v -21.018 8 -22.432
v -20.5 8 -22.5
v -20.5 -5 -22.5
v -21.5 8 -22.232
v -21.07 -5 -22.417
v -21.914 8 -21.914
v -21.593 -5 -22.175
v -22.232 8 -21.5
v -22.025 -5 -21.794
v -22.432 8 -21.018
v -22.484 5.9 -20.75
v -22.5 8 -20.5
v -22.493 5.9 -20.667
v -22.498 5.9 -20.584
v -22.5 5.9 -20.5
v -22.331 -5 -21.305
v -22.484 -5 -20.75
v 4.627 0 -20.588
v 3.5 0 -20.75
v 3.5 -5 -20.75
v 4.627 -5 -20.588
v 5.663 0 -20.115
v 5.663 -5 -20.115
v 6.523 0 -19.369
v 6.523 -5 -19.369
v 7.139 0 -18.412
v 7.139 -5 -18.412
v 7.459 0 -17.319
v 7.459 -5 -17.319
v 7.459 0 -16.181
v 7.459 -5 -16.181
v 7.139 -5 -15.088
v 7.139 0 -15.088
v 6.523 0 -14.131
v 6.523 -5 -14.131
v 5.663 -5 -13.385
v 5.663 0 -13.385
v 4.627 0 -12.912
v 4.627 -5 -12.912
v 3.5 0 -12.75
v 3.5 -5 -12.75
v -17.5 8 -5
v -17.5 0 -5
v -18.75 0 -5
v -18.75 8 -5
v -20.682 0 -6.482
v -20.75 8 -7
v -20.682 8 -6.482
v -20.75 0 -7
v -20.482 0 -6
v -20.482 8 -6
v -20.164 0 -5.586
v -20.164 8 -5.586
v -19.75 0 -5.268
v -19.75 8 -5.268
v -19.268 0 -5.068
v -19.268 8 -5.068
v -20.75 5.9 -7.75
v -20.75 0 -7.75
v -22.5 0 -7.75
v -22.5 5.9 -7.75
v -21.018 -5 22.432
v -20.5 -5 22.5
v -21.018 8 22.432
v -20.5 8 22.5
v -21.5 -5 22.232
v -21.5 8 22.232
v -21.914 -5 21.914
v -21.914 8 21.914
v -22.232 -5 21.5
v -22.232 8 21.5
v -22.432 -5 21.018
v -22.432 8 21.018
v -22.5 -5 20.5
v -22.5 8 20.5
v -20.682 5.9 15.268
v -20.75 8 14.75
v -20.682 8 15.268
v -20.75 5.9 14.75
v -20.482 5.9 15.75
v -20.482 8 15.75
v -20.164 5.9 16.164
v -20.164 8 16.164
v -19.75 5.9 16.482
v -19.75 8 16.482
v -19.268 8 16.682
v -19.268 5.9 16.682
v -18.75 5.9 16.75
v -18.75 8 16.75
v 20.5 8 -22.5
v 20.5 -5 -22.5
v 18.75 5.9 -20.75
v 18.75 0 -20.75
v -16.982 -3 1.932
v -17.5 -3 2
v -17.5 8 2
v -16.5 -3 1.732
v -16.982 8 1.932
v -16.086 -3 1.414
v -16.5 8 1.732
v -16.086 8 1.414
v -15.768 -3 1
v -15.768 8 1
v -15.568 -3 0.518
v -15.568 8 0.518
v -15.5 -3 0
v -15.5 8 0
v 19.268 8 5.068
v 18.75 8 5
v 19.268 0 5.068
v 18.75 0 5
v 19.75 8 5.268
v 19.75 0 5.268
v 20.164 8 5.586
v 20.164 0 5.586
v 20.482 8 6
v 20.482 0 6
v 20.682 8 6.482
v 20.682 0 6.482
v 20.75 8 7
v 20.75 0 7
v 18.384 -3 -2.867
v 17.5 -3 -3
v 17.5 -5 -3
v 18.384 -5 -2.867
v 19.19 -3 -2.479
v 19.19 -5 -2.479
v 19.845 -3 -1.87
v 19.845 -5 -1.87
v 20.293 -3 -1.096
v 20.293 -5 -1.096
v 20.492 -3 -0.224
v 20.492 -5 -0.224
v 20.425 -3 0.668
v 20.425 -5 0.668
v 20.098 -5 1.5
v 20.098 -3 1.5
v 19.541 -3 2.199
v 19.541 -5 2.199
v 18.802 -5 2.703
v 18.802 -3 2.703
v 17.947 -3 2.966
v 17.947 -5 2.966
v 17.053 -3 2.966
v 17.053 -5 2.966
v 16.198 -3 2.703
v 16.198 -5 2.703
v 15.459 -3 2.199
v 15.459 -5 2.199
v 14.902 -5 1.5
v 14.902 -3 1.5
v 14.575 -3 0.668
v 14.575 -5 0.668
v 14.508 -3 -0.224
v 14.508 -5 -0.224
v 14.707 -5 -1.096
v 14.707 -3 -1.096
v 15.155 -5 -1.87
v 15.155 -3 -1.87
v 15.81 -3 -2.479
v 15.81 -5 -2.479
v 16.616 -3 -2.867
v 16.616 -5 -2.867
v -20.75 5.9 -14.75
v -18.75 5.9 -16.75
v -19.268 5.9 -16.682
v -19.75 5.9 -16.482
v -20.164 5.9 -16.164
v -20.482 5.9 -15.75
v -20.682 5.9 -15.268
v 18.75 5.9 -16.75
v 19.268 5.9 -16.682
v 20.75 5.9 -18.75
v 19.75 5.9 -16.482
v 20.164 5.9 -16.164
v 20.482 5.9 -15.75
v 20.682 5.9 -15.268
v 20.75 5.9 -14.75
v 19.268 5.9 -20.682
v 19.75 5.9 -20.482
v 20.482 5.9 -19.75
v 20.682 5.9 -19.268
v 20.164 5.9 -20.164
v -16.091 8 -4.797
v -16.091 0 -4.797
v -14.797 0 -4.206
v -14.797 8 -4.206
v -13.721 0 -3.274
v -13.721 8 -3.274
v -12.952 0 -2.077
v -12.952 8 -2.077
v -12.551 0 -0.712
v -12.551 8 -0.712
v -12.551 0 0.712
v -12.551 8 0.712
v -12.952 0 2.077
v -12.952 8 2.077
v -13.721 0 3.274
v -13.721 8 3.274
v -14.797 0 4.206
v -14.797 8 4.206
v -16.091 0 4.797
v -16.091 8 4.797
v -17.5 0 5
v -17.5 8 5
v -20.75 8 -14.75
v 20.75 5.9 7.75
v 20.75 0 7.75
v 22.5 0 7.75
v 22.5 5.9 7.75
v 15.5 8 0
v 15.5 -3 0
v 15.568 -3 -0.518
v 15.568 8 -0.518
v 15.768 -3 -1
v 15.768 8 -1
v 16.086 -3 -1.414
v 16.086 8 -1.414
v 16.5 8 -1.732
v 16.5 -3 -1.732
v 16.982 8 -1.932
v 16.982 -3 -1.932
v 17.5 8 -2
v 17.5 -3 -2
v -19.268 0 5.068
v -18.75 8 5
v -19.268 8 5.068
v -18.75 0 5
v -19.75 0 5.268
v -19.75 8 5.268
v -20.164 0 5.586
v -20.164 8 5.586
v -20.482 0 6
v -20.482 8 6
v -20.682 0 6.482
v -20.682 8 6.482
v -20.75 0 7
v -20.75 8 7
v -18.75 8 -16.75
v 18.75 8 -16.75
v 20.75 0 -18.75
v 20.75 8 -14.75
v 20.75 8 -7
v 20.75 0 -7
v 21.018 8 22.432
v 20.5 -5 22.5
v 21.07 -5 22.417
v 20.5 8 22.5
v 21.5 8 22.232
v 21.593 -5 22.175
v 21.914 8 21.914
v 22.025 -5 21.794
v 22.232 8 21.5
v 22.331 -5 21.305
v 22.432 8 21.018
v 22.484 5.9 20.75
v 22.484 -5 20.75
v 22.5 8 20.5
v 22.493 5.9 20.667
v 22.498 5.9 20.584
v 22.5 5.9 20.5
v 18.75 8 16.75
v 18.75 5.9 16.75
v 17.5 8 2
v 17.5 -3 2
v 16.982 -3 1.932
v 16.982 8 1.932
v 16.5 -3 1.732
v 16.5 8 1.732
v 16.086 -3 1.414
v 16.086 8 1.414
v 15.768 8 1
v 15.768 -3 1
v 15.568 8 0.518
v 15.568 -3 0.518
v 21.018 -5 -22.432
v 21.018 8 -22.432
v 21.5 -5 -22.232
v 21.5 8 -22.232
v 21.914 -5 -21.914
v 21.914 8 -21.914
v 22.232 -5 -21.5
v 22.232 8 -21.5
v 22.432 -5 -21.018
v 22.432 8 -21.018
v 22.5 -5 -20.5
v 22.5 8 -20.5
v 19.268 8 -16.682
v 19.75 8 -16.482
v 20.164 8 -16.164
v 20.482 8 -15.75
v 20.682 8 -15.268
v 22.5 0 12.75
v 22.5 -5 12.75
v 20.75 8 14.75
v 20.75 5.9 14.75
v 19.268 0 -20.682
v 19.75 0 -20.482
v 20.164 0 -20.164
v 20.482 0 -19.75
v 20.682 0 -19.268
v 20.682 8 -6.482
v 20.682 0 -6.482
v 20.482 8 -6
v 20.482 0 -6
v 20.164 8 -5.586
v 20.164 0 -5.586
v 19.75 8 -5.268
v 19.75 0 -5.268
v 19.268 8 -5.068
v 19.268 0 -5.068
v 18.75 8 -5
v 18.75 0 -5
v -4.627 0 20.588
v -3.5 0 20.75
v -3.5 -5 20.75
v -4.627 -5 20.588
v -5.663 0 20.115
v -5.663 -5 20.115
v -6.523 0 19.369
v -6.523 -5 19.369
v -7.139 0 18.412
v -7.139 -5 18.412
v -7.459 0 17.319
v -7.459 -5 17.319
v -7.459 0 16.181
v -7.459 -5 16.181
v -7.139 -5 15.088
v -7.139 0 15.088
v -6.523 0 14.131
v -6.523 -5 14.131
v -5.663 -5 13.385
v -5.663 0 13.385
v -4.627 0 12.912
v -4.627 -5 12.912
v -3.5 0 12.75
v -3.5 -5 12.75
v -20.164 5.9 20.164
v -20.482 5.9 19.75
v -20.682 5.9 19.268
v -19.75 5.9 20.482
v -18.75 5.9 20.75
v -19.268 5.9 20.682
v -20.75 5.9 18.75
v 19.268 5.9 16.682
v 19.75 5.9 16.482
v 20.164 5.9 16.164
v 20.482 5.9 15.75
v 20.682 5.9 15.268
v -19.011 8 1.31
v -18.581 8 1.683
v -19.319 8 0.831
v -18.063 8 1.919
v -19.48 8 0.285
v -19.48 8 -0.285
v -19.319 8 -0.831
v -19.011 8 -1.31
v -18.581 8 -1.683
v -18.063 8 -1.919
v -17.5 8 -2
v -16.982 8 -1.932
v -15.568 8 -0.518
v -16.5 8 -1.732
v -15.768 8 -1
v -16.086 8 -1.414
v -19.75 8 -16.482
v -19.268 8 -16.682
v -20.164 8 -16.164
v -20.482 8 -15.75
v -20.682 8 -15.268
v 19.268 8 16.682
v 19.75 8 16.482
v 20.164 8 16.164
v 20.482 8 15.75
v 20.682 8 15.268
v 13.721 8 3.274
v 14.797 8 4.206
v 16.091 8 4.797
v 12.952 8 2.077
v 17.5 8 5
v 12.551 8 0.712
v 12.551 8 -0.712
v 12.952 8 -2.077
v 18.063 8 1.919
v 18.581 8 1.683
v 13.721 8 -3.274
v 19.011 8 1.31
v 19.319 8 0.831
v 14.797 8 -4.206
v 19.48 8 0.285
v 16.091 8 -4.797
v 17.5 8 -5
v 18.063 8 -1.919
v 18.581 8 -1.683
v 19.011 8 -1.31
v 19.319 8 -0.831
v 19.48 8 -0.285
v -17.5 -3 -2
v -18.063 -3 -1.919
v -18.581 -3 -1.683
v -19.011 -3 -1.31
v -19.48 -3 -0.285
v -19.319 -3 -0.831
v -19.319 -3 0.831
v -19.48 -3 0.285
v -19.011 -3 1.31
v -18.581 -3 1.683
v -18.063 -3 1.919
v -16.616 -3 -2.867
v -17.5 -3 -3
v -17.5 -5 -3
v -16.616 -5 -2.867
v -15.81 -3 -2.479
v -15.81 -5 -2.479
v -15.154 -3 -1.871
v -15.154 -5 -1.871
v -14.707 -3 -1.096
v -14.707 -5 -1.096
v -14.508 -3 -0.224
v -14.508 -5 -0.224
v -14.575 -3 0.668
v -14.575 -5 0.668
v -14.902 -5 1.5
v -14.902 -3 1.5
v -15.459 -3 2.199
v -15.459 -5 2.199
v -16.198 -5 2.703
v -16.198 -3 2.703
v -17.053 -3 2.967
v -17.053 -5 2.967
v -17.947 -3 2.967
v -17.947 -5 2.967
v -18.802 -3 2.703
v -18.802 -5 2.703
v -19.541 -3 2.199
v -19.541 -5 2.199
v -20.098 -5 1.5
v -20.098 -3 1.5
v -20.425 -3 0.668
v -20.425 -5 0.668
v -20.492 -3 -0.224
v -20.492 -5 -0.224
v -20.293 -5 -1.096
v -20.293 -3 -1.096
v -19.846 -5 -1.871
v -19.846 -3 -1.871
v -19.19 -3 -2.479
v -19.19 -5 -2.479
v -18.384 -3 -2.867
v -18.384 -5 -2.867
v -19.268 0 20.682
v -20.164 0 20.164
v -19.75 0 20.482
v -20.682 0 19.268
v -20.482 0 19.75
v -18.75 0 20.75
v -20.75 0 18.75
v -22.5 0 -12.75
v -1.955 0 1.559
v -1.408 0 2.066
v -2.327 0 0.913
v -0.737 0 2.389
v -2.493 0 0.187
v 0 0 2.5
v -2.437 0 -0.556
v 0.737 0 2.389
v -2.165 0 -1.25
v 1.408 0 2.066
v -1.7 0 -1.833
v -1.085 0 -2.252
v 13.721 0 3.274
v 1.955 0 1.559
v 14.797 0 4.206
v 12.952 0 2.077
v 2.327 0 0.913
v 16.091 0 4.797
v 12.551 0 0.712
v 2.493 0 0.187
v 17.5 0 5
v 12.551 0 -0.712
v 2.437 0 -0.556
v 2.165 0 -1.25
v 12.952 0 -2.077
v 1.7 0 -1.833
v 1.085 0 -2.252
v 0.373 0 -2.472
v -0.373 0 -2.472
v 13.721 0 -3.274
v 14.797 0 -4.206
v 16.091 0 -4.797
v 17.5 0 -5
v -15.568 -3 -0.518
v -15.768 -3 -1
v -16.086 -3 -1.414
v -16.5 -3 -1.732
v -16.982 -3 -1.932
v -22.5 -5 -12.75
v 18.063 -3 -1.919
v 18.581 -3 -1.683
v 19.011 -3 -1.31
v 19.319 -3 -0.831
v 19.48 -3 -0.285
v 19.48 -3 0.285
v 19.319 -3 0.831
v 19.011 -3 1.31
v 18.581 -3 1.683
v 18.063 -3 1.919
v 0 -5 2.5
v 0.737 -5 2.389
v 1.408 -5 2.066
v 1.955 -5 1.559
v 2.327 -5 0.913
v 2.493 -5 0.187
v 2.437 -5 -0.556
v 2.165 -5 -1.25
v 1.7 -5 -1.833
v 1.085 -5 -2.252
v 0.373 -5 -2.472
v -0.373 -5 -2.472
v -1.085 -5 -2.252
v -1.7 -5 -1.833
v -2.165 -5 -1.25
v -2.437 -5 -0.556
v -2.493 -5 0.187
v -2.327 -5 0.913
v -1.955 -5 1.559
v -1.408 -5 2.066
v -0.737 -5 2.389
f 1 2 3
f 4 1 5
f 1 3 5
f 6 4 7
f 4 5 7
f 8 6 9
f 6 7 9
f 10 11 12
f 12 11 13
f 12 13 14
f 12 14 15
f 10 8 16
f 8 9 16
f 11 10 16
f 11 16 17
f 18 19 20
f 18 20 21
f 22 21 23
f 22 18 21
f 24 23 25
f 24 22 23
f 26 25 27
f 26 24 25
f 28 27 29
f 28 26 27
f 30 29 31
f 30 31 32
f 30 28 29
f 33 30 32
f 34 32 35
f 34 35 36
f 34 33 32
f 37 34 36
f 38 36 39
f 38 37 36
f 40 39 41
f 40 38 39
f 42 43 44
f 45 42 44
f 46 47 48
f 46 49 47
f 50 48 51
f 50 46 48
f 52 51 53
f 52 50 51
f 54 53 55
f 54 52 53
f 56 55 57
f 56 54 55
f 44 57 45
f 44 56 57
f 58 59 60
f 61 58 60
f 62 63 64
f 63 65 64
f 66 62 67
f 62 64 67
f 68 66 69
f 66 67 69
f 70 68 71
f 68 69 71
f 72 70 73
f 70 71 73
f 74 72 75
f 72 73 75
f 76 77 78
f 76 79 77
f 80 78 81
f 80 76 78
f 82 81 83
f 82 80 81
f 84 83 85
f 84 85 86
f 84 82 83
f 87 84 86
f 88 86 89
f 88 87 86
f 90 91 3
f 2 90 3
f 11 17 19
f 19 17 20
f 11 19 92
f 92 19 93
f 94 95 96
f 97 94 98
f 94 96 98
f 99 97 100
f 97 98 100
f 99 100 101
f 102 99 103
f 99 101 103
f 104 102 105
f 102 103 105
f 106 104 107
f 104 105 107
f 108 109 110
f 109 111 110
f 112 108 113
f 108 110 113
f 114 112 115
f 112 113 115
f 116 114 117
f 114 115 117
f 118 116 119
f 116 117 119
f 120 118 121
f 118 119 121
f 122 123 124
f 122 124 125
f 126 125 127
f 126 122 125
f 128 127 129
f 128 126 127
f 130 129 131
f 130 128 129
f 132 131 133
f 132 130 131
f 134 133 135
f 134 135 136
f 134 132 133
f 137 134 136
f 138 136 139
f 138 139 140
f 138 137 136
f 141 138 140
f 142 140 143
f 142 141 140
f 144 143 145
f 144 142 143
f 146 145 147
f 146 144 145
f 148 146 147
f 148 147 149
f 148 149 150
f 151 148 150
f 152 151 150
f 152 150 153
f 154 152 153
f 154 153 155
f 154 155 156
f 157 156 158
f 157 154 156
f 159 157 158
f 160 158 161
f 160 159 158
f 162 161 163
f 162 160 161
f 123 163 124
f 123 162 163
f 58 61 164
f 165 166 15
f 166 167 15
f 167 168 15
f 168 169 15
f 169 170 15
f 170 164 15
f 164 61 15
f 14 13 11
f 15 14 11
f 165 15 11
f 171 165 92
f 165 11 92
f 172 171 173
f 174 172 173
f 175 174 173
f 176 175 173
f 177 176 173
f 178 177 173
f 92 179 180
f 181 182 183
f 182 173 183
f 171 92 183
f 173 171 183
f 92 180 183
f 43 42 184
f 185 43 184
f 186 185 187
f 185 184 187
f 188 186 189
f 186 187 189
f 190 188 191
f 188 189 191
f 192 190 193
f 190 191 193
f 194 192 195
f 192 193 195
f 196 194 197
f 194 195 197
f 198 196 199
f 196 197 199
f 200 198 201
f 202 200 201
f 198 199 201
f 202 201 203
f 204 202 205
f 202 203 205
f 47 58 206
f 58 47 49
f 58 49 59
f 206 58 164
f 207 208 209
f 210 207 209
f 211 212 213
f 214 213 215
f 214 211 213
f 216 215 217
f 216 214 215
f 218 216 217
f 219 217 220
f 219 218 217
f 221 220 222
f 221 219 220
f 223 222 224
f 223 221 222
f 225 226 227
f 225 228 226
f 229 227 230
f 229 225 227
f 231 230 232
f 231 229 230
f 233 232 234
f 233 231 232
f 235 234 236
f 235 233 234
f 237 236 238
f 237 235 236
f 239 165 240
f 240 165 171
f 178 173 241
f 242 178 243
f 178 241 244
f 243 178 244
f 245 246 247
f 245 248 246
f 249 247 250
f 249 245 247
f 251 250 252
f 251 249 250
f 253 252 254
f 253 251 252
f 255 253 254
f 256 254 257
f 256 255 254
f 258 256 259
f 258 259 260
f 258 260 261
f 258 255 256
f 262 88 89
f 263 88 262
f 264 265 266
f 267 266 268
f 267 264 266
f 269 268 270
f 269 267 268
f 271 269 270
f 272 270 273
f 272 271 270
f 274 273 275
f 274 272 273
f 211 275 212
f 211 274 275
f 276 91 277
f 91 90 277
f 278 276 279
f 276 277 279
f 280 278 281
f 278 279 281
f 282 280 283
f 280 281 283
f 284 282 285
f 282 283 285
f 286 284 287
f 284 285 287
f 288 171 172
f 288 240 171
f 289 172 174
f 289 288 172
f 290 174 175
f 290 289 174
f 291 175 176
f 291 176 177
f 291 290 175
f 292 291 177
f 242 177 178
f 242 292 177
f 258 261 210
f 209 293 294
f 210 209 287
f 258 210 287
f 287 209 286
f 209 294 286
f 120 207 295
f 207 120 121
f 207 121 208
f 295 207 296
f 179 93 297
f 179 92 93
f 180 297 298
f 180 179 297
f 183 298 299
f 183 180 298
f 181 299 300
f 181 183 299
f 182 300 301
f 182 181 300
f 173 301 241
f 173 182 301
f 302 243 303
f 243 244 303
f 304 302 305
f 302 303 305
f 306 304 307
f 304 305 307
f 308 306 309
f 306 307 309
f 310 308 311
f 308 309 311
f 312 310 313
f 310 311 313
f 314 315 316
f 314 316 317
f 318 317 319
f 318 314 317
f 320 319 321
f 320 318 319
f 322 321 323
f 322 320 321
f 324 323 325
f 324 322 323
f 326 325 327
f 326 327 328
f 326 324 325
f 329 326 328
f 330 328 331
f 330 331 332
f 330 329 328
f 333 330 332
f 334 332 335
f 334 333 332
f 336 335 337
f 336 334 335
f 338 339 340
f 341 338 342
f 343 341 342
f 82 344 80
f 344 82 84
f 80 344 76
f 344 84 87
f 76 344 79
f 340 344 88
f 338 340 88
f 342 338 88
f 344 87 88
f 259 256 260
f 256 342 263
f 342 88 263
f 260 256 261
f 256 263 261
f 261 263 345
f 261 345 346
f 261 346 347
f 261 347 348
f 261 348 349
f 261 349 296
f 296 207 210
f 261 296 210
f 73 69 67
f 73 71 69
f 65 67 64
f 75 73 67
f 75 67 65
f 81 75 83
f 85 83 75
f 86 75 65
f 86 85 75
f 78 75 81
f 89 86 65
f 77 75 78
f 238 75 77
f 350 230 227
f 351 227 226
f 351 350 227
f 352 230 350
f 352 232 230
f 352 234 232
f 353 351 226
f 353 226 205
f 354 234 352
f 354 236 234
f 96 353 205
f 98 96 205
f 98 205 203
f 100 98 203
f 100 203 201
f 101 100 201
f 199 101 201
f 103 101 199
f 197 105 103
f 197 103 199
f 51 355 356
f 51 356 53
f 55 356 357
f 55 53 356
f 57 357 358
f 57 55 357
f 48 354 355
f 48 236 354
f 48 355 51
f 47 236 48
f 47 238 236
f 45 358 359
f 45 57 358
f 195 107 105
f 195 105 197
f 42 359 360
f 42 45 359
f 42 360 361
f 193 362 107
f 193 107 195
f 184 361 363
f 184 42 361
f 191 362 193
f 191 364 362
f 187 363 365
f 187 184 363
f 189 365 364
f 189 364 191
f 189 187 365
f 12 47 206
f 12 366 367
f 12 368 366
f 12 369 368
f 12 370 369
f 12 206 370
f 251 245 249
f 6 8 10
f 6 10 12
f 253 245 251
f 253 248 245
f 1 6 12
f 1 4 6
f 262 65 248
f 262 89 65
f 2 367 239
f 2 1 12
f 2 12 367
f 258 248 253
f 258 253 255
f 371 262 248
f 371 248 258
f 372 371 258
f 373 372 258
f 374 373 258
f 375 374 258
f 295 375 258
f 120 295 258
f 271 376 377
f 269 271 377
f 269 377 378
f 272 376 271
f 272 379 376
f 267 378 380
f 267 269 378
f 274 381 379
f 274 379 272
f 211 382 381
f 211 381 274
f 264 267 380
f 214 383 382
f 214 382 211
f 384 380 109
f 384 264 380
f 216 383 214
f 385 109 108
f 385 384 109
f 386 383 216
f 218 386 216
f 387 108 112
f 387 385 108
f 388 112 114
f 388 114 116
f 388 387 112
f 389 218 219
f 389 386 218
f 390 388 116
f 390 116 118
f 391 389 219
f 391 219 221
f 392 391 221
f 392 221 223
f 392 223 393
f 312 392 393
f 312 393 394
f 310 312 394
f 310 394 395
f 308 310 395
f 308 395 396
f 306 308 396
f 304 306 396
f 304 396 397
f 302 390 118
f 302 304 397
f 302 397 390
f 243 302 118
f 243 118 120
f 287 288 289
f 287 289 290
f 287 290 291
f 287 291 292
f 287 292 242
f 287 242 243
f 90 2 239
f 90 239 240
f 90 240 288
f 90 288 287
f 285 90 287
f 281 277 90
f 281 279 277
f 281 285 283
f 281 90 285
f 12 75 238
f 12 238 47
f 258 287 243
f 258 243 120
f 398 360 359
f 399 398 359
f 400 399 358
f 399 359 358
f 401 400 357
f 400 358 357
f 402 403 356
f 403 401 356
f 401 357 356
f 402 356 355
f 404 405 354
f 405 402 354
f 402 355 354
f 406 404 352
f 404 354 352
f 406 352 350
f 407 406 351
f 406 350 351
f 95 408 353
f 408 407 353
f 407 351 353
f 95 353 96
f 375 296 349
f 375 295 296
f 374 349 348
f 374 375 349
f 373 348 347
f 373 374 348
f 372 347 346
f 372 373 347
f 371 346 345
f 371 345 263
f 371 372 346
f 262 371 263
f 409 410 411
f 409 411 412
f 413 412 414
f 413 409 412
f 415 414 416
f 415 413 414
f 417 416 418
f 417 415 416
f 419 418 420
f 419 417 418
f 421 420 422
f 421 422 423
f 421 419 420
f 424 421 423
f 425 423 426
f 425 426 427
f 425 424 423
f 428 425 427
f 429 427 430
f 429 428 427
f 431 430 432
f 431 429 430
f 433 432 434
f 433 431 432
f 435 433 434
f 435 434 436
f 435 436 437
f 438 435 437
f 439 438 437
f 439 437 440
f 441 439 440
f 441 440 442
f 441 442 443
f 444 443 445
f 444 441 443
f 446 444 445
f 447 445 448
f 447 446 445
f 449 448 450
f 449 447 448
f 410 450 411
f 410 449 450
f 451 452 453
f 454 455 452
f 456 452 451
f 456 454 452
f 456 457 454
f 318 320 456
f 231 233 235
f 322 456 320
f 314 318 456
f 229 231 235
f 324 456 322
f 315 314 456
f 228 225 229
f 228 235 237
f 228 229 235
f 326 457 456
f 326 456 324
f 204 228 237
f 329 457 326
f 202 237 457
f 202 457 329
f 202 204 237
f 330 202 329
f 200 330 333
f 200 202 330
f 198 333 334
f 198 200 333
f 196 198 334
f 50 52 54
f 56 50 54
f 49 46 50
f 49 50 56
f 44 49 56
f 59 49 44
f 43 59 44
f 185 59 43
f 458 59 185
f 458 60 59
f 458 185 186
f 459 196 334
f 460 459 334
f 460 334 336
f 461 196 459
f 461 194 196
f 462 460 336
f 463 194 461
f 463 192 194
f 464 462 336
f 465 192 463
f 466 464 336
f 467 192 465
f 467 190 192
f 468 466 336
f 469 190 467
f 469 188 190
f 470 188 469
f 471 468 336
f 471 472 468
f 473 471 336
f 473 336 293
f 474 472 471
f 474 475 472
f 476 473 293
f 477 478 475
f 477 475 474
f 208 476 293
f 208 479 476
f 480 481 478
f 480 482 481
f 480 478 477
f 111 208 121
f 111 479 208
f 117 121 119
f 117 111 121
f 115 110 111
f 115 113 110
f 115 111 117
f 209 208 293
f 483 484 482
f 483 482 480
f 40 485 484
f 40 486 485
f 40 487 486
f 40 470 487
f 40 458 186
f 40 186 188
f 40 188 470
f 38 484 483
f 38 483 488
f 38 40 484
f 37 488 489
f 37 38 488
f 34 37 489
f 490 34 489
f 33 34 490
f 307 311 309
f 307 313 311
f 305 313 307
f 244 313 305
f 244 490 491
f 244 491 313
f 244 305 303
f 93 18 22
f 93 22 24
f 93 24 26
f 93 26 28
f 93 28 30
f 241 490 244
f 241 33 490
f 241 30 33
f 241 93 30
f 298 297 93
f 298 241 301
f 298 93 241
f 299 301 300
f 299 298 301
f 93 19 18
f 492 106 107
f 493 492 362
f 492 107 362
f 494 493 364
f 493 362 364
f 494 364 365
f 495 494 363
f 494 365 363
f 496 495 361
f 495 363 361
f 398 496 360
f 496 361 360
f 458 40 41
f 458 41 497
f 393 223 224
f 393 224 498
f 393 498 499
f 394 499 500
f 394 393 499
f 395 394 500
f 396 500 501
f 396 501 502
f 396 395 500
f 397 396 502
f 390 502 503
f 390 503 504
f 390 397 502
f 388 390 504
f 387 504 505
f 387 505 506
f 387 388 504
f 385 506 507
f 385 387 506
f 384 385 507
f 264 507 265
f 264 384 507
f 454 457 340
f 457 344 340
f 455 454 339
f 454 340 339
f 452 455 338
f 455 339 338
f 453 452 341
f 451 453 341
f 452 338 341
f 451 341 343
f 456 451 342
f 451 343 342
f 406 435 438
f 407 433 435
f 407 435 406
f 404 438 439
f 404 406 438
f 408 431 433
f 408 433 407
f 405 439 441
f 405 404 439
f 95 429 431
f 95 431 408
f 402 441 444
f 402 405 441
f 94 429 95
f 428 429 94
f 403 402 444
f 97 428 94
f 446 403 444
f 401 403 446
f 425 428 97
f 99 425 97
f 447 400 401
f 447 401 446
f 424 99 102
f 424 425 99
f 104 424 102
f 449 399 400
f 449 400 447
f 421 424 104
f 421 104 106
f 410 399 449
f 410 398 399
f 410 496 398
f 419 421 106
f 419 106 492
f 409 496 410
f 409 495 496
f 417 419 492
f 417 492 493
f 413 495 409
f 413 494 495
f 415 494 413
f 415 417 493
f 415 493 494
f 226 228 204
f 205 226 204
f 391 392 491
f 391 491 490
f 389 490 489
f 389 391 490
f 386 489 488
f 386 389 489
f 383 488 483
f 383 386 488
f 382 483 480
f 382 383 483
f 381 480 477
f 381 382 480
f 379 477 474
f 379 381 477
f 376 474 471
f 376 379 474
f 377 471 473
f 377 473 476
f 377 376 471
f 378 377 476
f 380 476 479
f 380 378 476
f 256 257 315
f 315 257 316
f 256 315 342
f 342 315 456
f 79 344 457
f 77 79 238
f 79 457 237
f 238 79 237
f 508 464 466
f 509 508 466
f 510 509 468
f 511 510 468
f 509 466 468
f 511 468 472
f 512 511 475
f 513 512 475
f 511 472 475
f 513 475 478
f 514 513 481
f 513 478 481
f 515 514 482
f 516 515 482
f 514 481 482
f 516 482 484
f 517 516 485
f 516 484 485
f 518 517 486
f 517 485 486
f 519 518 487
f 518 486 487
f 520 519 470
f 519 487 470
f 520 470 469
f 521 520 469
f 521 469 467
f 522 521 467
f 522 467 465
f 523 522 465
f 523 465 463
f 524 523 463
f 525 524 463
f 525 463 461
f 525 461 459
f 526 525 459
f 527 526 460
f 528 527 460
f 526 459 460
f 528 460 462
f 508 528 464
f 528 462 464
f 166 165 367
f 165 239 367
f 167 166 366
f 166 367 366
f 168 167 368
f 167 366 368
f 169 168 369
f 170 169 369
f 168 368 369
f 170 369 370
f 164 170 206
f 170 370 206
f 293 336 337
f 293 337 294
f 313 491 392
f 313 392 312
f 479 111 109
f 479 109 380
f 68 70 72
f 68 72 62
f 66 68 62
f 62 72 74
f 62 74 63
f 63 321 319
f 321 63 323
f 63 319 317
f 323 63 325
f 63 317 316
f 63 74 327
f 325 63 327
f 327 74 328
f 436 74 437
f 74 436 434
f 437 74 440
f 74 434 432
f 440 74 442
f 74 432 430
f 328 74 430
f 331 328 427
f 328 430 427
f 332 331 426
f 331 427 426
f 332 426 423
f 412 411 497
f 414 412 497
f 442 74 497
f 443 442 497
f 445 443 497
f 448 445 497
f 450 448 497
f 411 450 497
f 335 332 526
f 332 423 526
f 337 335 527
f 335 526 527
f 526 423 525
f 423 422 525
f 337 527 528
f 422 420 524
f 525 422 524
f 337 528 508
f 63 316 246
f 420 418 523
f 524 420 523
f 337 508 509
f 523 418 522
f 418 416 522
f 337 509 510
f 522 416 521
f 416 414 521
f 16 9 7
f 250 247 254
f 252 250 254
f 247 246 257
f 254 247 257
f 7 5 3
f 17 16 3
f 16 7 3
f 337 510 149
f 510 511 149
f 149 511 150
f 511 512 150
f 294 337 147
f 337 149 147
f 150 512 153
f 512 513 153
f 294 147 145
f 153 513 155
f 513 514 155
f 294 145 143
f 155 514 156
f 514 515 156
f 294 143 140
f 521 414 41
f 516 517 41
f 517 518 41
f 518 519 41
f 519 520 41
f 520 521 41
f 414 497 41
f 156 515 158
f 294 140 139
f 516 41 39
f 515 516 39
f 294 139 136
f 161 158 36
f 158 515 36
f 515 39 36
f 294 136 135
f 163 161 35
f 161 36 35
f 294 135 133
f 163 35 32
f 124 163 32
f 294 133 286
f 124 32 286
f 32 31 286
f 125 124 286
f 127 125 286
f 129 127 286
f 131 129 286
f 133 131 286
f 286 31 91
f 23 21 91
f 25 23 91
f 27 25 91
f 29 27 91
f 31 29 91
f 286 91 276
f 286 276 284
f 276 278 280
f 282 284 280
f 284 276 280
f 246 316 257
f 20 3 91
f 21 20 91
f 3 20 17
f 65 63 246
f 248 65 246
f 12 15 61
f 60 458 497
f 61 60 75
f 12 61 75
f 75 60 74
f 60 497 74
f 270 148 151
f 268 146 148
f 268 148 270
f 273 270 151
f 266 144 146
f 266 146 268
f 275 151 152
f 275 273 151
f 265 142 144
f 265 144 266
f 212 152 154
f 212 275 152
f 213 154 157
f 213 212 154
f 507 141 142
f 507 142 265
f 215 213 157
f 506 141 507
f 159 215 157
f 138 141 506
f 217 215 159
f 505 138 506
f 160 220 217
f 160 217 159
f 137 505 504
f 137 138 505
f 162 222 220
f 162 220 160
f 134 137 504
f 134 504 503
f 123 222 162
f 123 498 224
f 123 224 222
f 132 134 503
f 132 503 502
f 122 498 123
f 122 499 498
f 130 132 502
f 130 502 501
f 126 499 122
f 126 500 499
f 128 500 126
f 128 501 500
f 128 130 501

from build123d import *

# Parameters (mm, degrees)
CROQUIS1_R                   = 2.5
SALIENTE_EXTRUIR1_DEPTH      = 5
SALIENTE_EXTRUIR2_DEPTH      = 6
SALIENTE_EXTRUIR5_DEPTH      = 2
SALIENTE_EXTRUIR5_DEPTH_BACK = 0.1
CROQUIS2_W                   = 41.5
CROQUIS2_H                   = 5.75
CROQUIS2_H_2                 = 4
CROQUIS2_H_3                 = 1.75
CROQUIS2_W_2                 = 1.75
CROQUIS3_R                   = 2
SALIENTE_EXTRUIR6_DEPTH      = 8
CORTAR_EXTRUIR1_REACH        = 36.373
CORTAR_EXTRUIR2_START        = -2
CROQUIS4_R                   = 3.000239327
CROQUIS4_R_2                 = 2
CROQUIS4_R_3                 = 3
CORTAR_EXTRUIR2_DEPTH        = 2
REDONDEO1_R                  = 2
REDONDEO2_R                  = 2


with BuildPart() as part:
    # Croquis1 → Saliente-Extruir1 (new body)
    with BuildSketch(Plane(origin=(0, 0, 0), x_dir=(1, 0, 0), z_dir=(0, 1, 0))):
        with BuildLine():
            Line((-22.5, -22.5), (22.5, -22.5))
            Line((22.5, -22.5), (22.5, -20.75))
            Line((22.5, -20.75), (-3.5, -20.75))
            ThreePointArc((-3.5, -20.75), (-7.5, -16.75), (-3.5, -12.75))
            Line((-3.5, -12.75), (22.5, -12.75))
            Line((22.5, -12.75), (22.5, 22.5))
            Line((22.5, 22.5), (-22.5, 22.5))
            Line((-22.5, 22.5), (-22.5, 20.75))
            Line((-22.5, 20.75), (3.5, 20.75))
            ThreePointArc((3.5, 20.75), (7.5, 16.75), (3.5, 12.75))
            Line((3.5, 12.75), (-22.5, 12.75))
            Line((-22.5, 12.75), (-22.5, -22.5))
        make_face()
        with Locations(Location((0, 0, 0), (0, 0, 270))):
            Circle(CROQUIS1_R, mode=Mode.SUBTRACT)
    extrude(amount=-SALIENTE_EXTRUIR1_DEPTH)

    # Croquis1<3> → Saliente-Extruir2 (add)
    with BuildSketch(Plane(origin=(0, 0, 0), x_dir=(1, 0, 0), z_dir=(0, 1, 0))):
        Polygon((-22.5, 7.75), (-22.5, -22.5), (22.5, -22.5), (22.5, -20.75), (-3.5, -20.75), (-20.75, -20.75), (-20.75, 7.75), align=None)
        Polygon((-22.5, 22.5), (-22.5, 20.75), (3.5, 20.75), (20.75, 20.75), (20.75, -7.75), (22.5, -7.75), (22.5, 22.5), align=None)
    extrude(amount=SALIENTE_EXTRUIR2_DEPTH)

    # Croquis2 → Saliente-Extruir5 (add, two sides: drawn at the far end of the back side and taken through both)
    with BuildSketch(Plane(origin=(0, 6, 0), x_dir=(1, 0, 0), z_dir=(0, 1, 0)).offset(-SALIENTE_EXTRUIR5_DEPTH_BACK)):
        with Locations((0, 19.625)):
            Rectangle(CROQUIS2_W, CROQUIS2_H)
        Polygon((-20.75, 22.5), (-22.5, 22.5), (-22.5, 7.75), (-20.75, 7.75), (-20.75, 16.75), align=None)
        with Locations((0, -18.75)):
            Rectangle(CROQUIS2_W, CROQUIS2_H_2)
        with Locations((0, -21.625)):
            Rectangle(CROQUIS2_W, CROQUIS2_H_3)
        Polygon((-20.75, 7.75), (-22.5, 7.75), (-22.5, -22.5), (-20.75, -22.5), (-20.75, -20.75), (-20.75, -16.75), align=None)
        Polygon((22.5, 22.5), (20.75, 22.5), (20.75, 16.75), (20.75, -16.75), (20.75, -20.75), (22.5, -20.75), align=None)
        with Locations((21.625, -21.625)):
            Rectangle(CROQUIS2_W_2, CROQUIS2_H_3)
    extrude(amount=SALIENTE_EXTRUIR5_DEPTH + SALIENTE_EXTRUIR5_DEPTH_BACK)

    # Croquis3 → Saliente-Extruir6 (add)
    with BuildSketch(Plane(origin=(0, 8, 0), x_dir=(1, 0, 0), z_dir=(0, 1, 0))):
        with BuildLine():
            Line((-20.75, 5), (-20.75, -5))
            Line((-20.75, -5), (-17.5, -5))
            Line((-17.5, -5), (-17.5, -2))
            ThreePointArc((-17.5, -2), (-19.5, 0), (-17.5, 2))
            Line((-17.5, 2), (-17.5, 5))
            Line((-17.5, 5), (-20.75, 5))
        make_face()
        with Locations((-17.5, 0)):
            Circle(CROQUIS3_R)
        with BuildLine():
            Line((-17.5, -5), (-17.5, 5))
            ThreePointArc((-17.5, 5), (-12.5, 0), (-17.5, -5))
        make_face()
        with BuildLine():
            ThreePointArc((-17.5, 2), (-19.5, 0), (-17.5, -2))
            Line((-17.5, -2), (-17.5, 2))
        make_face()
        with BuildLine():
            Line((-17.5, 2), (-17.5, -2))
            ThreePointArc((-17.5, -2), (-16.085786438, -1.414213562), (-15.5, 0))
            ThreePointArc((-15.5, 0), (-16.085786438, 1.414213562), (-17.5, 2))
        make_face()
    saliente_extruir6 = extrude(amount=-SALIENTE_EXTRUIR6_DEPTH)

    # Croquis3<3> → Cortar-Extruir1 (cut, up to next)
    with BuildSketch(Plane(origin=(0, 8, 0), x_dir=(1, 0, 0), z_dir=(0, 1, 0)), mode=Mode.PRIVATE) as cortar_extruir1_sk1:
        with BuildLine():
            ThreePointArc((-17.5, 2), (-19.5, 0), (-17.5, -2))
            Line((-17.5, -2), (-17.5, 2))
        make_face()
    cortar_extruir1_tool1 = extrude(cortar_extruir1_sk1.sketch, amount=-CORTAR_EXTRUIR1_REACH, mode=Mode.PRIVATE) & part.part
    # Croquis3<3> → Cortar-Extruir1 (cut, up to next)
    with BuildSketch(Plane(origin=(0, 8, 0), x_dir=(1, 0, 0), z_dir=(0, 1, 0)), mode=Mode.PRIVATE) as cortar_extruir1_sk2:
        with BuildLine():
            Line((-17.5, 2), (-17.5, -2))
            ThreePointArc((-17.5, -2), (-16.085786438, -1.414213562), (-15.5, 0))
            ThreePointArc((-15.5, 0), (-16.085786438, 1.414213562), (-17.5, 2))
        make_face()
    cortar_extruir1_tool2 = extrude(cortar_extruir1_sk2.sketch, amount=-CORTAR_EXTRUIR1_REACH, mode=Mode.PRIVATE) & part.part
    # Croquis3<3> → Cortar-Extruir1 (cut, up to next)
    with BuildSketch(Plane(origin=(0, 8, 0), x_dir=(1, 0, 0), z_dir=(0, 1, 0)), mode=Mode.PRIVATE) as cortar_extruir1_sk3:
        with BuildLine():
            ThreePointArc((-17.5, 2), (-19.5, 0), (-17.5, -2))
            Line((-17.5, -2), (-17.5, 2))
        make_face()
    cortar_extruir1_tool3 = extrude(cortar_extruir1_sk3.sketch, amount=-CORTAR_EXTRUIR1_REACH, mode=Mode.PRIVATE) & part.part
    # Croquis3<3> → Cortar-Extruir1 (cut, up to next)
    with BuildSketch(Plane(origin=(0, 8, 0), x_dir=(1, 0, 0), z_dir=(0, 1, 0)), mode=Mode.PRIVATE) as cortar_extruir1_sk4:
        with BuildLine():
            Line((-17.5, 2), (-17.5, -2))
            ThreePointArc((-17.5, -2), (-16.085786438, -1.414213562), (-15.5, 0))
            ThreePointArc((-15.5, 0), (-16.085786438, 1.414213562), (-17.5, 2))
        make_face()
    cortar_extruir1_tool4 = extrude(cortar_extruir1_sk4.sketch, amount=-CORTAR_EXTRUIR1_REACH, mode=Mode.PRIVATE) & part.part
    cortar_extruir1_1 = cortar_extruir1_tool1.solids().sort_by_distance((-18.348826, 8, 0))[0]
    add(cortar_extruir1_1, mode=Mode.SUBTRACT)
    cortar_extruir1_2 = cortar_extruir1_tool2.solids().sort_by_distance((-16.651174, 8, 0))[0]
    add(cortar_extruir1_2, mode=Mode.SUBTRACT)
    cortar_extruir1_3 = cortar_extruir1_tool3.solids().sort_by_distance((-18.348826, 8, 0))[0]
    add(cortar_extruir1_3, mode=Mode.SUBTRACT)
    cortar_extruir1_4 = cortar_extruir1_tool4.solids().sort_by_distance((-16.651174, 8, 0))[0]
    add(cortar_extruir1_4, mode=Mode.SUBTRACT)
    cortar_extruir1 = cortar_extruir1_1 + cortar_extruir1_2 + cortar_extruir1_3 + cortar_extruir1_4  # Cortar-Extruir1 as one shape, for the pattern or mirror that repeats it

    # Simetría1: Saliente-Extruir6, Cortar-Extruir1 across plane
    add(saliente_extruir6.mirror(Plane(origin=(0, 0, 0), x_dir=(0, 0, 1), z_dir=(1, 0, 0))))
    add(cortar_extruir1.mirror(Plane(origin=(0, 0, 0), x_dir=(0, 0, 1), z_dir=(1, 0, 0))), mode=Mode.SUBTRACT)

    # Croquis4 → Cortar-Extruir2 (cut)
    # profile 1 of 2: a face of its own
    with BuildSketch(Plane.XZ.offset(5).offset(CORTAR_EXTRUIR2_START)):
        with Locations(Location((-17.5, 0, 0), (0, 0, 270))):
            Circle(CROQUIS4_R)
        with Locations(Location((-17.5, 0, 0), (0, 0, 90))):
            Circle(CROQUIS4_R_2, mode=Mode.SUBTRACT)
    # profile 2 of 2: a face of its own
    with BuildSketch(Plane.XZ.offset(5).offset(CORTAR_EXTRUIR2_START)):
        with Locations(Location((17.5, 0, 0), (0, 0, 270))):
            Circle(CROQUIS4_R_3)
        with Locations(Location((17.5, 0, 0), (0, 0, 90))):
            Circle(CROQUIS4_R_2, mode=Mode.SUBTRACT)
    extrude(amount=CORTAR_EXTRUIR2_DEPTH, mode=Mode.SUBTRACT)

    # Redondeo1
    redondeo1_edges = [part.edges().sort_by_distance(p)[0] for p in [
        (20.75, 6.95, 16.75),
        (-20.75, 6.95, 16.75),
        (20.75, 6.95, -16.75),
        (-20.75, 4, -5),
        (-20.75, 4, 5),
        (20.75, 4, 5),
        (20.75, 4, -5),
        (-20.75, 6.95, -16.75),
    ]]
    fillet(redondeo1_edges, radius=REDONDEO1_R)

    # Redondeo2
    redondeo2_edges = [part.edges().sort_by_distance(p)[0] for p in [
        (-22.5, 1.5, -22.5),
        (22.5, 1.5, -22.5),
        (-22.5, 1.5, 22.5),
        (22.5, 1.5, 22.5),
        (20.75, 2.95, -20.75),
        (-20.75, 2.95, 20.75),
    ]]
    fillet(redondeo2_edges, radius=REDONDEO2_R)


solid = part.part
